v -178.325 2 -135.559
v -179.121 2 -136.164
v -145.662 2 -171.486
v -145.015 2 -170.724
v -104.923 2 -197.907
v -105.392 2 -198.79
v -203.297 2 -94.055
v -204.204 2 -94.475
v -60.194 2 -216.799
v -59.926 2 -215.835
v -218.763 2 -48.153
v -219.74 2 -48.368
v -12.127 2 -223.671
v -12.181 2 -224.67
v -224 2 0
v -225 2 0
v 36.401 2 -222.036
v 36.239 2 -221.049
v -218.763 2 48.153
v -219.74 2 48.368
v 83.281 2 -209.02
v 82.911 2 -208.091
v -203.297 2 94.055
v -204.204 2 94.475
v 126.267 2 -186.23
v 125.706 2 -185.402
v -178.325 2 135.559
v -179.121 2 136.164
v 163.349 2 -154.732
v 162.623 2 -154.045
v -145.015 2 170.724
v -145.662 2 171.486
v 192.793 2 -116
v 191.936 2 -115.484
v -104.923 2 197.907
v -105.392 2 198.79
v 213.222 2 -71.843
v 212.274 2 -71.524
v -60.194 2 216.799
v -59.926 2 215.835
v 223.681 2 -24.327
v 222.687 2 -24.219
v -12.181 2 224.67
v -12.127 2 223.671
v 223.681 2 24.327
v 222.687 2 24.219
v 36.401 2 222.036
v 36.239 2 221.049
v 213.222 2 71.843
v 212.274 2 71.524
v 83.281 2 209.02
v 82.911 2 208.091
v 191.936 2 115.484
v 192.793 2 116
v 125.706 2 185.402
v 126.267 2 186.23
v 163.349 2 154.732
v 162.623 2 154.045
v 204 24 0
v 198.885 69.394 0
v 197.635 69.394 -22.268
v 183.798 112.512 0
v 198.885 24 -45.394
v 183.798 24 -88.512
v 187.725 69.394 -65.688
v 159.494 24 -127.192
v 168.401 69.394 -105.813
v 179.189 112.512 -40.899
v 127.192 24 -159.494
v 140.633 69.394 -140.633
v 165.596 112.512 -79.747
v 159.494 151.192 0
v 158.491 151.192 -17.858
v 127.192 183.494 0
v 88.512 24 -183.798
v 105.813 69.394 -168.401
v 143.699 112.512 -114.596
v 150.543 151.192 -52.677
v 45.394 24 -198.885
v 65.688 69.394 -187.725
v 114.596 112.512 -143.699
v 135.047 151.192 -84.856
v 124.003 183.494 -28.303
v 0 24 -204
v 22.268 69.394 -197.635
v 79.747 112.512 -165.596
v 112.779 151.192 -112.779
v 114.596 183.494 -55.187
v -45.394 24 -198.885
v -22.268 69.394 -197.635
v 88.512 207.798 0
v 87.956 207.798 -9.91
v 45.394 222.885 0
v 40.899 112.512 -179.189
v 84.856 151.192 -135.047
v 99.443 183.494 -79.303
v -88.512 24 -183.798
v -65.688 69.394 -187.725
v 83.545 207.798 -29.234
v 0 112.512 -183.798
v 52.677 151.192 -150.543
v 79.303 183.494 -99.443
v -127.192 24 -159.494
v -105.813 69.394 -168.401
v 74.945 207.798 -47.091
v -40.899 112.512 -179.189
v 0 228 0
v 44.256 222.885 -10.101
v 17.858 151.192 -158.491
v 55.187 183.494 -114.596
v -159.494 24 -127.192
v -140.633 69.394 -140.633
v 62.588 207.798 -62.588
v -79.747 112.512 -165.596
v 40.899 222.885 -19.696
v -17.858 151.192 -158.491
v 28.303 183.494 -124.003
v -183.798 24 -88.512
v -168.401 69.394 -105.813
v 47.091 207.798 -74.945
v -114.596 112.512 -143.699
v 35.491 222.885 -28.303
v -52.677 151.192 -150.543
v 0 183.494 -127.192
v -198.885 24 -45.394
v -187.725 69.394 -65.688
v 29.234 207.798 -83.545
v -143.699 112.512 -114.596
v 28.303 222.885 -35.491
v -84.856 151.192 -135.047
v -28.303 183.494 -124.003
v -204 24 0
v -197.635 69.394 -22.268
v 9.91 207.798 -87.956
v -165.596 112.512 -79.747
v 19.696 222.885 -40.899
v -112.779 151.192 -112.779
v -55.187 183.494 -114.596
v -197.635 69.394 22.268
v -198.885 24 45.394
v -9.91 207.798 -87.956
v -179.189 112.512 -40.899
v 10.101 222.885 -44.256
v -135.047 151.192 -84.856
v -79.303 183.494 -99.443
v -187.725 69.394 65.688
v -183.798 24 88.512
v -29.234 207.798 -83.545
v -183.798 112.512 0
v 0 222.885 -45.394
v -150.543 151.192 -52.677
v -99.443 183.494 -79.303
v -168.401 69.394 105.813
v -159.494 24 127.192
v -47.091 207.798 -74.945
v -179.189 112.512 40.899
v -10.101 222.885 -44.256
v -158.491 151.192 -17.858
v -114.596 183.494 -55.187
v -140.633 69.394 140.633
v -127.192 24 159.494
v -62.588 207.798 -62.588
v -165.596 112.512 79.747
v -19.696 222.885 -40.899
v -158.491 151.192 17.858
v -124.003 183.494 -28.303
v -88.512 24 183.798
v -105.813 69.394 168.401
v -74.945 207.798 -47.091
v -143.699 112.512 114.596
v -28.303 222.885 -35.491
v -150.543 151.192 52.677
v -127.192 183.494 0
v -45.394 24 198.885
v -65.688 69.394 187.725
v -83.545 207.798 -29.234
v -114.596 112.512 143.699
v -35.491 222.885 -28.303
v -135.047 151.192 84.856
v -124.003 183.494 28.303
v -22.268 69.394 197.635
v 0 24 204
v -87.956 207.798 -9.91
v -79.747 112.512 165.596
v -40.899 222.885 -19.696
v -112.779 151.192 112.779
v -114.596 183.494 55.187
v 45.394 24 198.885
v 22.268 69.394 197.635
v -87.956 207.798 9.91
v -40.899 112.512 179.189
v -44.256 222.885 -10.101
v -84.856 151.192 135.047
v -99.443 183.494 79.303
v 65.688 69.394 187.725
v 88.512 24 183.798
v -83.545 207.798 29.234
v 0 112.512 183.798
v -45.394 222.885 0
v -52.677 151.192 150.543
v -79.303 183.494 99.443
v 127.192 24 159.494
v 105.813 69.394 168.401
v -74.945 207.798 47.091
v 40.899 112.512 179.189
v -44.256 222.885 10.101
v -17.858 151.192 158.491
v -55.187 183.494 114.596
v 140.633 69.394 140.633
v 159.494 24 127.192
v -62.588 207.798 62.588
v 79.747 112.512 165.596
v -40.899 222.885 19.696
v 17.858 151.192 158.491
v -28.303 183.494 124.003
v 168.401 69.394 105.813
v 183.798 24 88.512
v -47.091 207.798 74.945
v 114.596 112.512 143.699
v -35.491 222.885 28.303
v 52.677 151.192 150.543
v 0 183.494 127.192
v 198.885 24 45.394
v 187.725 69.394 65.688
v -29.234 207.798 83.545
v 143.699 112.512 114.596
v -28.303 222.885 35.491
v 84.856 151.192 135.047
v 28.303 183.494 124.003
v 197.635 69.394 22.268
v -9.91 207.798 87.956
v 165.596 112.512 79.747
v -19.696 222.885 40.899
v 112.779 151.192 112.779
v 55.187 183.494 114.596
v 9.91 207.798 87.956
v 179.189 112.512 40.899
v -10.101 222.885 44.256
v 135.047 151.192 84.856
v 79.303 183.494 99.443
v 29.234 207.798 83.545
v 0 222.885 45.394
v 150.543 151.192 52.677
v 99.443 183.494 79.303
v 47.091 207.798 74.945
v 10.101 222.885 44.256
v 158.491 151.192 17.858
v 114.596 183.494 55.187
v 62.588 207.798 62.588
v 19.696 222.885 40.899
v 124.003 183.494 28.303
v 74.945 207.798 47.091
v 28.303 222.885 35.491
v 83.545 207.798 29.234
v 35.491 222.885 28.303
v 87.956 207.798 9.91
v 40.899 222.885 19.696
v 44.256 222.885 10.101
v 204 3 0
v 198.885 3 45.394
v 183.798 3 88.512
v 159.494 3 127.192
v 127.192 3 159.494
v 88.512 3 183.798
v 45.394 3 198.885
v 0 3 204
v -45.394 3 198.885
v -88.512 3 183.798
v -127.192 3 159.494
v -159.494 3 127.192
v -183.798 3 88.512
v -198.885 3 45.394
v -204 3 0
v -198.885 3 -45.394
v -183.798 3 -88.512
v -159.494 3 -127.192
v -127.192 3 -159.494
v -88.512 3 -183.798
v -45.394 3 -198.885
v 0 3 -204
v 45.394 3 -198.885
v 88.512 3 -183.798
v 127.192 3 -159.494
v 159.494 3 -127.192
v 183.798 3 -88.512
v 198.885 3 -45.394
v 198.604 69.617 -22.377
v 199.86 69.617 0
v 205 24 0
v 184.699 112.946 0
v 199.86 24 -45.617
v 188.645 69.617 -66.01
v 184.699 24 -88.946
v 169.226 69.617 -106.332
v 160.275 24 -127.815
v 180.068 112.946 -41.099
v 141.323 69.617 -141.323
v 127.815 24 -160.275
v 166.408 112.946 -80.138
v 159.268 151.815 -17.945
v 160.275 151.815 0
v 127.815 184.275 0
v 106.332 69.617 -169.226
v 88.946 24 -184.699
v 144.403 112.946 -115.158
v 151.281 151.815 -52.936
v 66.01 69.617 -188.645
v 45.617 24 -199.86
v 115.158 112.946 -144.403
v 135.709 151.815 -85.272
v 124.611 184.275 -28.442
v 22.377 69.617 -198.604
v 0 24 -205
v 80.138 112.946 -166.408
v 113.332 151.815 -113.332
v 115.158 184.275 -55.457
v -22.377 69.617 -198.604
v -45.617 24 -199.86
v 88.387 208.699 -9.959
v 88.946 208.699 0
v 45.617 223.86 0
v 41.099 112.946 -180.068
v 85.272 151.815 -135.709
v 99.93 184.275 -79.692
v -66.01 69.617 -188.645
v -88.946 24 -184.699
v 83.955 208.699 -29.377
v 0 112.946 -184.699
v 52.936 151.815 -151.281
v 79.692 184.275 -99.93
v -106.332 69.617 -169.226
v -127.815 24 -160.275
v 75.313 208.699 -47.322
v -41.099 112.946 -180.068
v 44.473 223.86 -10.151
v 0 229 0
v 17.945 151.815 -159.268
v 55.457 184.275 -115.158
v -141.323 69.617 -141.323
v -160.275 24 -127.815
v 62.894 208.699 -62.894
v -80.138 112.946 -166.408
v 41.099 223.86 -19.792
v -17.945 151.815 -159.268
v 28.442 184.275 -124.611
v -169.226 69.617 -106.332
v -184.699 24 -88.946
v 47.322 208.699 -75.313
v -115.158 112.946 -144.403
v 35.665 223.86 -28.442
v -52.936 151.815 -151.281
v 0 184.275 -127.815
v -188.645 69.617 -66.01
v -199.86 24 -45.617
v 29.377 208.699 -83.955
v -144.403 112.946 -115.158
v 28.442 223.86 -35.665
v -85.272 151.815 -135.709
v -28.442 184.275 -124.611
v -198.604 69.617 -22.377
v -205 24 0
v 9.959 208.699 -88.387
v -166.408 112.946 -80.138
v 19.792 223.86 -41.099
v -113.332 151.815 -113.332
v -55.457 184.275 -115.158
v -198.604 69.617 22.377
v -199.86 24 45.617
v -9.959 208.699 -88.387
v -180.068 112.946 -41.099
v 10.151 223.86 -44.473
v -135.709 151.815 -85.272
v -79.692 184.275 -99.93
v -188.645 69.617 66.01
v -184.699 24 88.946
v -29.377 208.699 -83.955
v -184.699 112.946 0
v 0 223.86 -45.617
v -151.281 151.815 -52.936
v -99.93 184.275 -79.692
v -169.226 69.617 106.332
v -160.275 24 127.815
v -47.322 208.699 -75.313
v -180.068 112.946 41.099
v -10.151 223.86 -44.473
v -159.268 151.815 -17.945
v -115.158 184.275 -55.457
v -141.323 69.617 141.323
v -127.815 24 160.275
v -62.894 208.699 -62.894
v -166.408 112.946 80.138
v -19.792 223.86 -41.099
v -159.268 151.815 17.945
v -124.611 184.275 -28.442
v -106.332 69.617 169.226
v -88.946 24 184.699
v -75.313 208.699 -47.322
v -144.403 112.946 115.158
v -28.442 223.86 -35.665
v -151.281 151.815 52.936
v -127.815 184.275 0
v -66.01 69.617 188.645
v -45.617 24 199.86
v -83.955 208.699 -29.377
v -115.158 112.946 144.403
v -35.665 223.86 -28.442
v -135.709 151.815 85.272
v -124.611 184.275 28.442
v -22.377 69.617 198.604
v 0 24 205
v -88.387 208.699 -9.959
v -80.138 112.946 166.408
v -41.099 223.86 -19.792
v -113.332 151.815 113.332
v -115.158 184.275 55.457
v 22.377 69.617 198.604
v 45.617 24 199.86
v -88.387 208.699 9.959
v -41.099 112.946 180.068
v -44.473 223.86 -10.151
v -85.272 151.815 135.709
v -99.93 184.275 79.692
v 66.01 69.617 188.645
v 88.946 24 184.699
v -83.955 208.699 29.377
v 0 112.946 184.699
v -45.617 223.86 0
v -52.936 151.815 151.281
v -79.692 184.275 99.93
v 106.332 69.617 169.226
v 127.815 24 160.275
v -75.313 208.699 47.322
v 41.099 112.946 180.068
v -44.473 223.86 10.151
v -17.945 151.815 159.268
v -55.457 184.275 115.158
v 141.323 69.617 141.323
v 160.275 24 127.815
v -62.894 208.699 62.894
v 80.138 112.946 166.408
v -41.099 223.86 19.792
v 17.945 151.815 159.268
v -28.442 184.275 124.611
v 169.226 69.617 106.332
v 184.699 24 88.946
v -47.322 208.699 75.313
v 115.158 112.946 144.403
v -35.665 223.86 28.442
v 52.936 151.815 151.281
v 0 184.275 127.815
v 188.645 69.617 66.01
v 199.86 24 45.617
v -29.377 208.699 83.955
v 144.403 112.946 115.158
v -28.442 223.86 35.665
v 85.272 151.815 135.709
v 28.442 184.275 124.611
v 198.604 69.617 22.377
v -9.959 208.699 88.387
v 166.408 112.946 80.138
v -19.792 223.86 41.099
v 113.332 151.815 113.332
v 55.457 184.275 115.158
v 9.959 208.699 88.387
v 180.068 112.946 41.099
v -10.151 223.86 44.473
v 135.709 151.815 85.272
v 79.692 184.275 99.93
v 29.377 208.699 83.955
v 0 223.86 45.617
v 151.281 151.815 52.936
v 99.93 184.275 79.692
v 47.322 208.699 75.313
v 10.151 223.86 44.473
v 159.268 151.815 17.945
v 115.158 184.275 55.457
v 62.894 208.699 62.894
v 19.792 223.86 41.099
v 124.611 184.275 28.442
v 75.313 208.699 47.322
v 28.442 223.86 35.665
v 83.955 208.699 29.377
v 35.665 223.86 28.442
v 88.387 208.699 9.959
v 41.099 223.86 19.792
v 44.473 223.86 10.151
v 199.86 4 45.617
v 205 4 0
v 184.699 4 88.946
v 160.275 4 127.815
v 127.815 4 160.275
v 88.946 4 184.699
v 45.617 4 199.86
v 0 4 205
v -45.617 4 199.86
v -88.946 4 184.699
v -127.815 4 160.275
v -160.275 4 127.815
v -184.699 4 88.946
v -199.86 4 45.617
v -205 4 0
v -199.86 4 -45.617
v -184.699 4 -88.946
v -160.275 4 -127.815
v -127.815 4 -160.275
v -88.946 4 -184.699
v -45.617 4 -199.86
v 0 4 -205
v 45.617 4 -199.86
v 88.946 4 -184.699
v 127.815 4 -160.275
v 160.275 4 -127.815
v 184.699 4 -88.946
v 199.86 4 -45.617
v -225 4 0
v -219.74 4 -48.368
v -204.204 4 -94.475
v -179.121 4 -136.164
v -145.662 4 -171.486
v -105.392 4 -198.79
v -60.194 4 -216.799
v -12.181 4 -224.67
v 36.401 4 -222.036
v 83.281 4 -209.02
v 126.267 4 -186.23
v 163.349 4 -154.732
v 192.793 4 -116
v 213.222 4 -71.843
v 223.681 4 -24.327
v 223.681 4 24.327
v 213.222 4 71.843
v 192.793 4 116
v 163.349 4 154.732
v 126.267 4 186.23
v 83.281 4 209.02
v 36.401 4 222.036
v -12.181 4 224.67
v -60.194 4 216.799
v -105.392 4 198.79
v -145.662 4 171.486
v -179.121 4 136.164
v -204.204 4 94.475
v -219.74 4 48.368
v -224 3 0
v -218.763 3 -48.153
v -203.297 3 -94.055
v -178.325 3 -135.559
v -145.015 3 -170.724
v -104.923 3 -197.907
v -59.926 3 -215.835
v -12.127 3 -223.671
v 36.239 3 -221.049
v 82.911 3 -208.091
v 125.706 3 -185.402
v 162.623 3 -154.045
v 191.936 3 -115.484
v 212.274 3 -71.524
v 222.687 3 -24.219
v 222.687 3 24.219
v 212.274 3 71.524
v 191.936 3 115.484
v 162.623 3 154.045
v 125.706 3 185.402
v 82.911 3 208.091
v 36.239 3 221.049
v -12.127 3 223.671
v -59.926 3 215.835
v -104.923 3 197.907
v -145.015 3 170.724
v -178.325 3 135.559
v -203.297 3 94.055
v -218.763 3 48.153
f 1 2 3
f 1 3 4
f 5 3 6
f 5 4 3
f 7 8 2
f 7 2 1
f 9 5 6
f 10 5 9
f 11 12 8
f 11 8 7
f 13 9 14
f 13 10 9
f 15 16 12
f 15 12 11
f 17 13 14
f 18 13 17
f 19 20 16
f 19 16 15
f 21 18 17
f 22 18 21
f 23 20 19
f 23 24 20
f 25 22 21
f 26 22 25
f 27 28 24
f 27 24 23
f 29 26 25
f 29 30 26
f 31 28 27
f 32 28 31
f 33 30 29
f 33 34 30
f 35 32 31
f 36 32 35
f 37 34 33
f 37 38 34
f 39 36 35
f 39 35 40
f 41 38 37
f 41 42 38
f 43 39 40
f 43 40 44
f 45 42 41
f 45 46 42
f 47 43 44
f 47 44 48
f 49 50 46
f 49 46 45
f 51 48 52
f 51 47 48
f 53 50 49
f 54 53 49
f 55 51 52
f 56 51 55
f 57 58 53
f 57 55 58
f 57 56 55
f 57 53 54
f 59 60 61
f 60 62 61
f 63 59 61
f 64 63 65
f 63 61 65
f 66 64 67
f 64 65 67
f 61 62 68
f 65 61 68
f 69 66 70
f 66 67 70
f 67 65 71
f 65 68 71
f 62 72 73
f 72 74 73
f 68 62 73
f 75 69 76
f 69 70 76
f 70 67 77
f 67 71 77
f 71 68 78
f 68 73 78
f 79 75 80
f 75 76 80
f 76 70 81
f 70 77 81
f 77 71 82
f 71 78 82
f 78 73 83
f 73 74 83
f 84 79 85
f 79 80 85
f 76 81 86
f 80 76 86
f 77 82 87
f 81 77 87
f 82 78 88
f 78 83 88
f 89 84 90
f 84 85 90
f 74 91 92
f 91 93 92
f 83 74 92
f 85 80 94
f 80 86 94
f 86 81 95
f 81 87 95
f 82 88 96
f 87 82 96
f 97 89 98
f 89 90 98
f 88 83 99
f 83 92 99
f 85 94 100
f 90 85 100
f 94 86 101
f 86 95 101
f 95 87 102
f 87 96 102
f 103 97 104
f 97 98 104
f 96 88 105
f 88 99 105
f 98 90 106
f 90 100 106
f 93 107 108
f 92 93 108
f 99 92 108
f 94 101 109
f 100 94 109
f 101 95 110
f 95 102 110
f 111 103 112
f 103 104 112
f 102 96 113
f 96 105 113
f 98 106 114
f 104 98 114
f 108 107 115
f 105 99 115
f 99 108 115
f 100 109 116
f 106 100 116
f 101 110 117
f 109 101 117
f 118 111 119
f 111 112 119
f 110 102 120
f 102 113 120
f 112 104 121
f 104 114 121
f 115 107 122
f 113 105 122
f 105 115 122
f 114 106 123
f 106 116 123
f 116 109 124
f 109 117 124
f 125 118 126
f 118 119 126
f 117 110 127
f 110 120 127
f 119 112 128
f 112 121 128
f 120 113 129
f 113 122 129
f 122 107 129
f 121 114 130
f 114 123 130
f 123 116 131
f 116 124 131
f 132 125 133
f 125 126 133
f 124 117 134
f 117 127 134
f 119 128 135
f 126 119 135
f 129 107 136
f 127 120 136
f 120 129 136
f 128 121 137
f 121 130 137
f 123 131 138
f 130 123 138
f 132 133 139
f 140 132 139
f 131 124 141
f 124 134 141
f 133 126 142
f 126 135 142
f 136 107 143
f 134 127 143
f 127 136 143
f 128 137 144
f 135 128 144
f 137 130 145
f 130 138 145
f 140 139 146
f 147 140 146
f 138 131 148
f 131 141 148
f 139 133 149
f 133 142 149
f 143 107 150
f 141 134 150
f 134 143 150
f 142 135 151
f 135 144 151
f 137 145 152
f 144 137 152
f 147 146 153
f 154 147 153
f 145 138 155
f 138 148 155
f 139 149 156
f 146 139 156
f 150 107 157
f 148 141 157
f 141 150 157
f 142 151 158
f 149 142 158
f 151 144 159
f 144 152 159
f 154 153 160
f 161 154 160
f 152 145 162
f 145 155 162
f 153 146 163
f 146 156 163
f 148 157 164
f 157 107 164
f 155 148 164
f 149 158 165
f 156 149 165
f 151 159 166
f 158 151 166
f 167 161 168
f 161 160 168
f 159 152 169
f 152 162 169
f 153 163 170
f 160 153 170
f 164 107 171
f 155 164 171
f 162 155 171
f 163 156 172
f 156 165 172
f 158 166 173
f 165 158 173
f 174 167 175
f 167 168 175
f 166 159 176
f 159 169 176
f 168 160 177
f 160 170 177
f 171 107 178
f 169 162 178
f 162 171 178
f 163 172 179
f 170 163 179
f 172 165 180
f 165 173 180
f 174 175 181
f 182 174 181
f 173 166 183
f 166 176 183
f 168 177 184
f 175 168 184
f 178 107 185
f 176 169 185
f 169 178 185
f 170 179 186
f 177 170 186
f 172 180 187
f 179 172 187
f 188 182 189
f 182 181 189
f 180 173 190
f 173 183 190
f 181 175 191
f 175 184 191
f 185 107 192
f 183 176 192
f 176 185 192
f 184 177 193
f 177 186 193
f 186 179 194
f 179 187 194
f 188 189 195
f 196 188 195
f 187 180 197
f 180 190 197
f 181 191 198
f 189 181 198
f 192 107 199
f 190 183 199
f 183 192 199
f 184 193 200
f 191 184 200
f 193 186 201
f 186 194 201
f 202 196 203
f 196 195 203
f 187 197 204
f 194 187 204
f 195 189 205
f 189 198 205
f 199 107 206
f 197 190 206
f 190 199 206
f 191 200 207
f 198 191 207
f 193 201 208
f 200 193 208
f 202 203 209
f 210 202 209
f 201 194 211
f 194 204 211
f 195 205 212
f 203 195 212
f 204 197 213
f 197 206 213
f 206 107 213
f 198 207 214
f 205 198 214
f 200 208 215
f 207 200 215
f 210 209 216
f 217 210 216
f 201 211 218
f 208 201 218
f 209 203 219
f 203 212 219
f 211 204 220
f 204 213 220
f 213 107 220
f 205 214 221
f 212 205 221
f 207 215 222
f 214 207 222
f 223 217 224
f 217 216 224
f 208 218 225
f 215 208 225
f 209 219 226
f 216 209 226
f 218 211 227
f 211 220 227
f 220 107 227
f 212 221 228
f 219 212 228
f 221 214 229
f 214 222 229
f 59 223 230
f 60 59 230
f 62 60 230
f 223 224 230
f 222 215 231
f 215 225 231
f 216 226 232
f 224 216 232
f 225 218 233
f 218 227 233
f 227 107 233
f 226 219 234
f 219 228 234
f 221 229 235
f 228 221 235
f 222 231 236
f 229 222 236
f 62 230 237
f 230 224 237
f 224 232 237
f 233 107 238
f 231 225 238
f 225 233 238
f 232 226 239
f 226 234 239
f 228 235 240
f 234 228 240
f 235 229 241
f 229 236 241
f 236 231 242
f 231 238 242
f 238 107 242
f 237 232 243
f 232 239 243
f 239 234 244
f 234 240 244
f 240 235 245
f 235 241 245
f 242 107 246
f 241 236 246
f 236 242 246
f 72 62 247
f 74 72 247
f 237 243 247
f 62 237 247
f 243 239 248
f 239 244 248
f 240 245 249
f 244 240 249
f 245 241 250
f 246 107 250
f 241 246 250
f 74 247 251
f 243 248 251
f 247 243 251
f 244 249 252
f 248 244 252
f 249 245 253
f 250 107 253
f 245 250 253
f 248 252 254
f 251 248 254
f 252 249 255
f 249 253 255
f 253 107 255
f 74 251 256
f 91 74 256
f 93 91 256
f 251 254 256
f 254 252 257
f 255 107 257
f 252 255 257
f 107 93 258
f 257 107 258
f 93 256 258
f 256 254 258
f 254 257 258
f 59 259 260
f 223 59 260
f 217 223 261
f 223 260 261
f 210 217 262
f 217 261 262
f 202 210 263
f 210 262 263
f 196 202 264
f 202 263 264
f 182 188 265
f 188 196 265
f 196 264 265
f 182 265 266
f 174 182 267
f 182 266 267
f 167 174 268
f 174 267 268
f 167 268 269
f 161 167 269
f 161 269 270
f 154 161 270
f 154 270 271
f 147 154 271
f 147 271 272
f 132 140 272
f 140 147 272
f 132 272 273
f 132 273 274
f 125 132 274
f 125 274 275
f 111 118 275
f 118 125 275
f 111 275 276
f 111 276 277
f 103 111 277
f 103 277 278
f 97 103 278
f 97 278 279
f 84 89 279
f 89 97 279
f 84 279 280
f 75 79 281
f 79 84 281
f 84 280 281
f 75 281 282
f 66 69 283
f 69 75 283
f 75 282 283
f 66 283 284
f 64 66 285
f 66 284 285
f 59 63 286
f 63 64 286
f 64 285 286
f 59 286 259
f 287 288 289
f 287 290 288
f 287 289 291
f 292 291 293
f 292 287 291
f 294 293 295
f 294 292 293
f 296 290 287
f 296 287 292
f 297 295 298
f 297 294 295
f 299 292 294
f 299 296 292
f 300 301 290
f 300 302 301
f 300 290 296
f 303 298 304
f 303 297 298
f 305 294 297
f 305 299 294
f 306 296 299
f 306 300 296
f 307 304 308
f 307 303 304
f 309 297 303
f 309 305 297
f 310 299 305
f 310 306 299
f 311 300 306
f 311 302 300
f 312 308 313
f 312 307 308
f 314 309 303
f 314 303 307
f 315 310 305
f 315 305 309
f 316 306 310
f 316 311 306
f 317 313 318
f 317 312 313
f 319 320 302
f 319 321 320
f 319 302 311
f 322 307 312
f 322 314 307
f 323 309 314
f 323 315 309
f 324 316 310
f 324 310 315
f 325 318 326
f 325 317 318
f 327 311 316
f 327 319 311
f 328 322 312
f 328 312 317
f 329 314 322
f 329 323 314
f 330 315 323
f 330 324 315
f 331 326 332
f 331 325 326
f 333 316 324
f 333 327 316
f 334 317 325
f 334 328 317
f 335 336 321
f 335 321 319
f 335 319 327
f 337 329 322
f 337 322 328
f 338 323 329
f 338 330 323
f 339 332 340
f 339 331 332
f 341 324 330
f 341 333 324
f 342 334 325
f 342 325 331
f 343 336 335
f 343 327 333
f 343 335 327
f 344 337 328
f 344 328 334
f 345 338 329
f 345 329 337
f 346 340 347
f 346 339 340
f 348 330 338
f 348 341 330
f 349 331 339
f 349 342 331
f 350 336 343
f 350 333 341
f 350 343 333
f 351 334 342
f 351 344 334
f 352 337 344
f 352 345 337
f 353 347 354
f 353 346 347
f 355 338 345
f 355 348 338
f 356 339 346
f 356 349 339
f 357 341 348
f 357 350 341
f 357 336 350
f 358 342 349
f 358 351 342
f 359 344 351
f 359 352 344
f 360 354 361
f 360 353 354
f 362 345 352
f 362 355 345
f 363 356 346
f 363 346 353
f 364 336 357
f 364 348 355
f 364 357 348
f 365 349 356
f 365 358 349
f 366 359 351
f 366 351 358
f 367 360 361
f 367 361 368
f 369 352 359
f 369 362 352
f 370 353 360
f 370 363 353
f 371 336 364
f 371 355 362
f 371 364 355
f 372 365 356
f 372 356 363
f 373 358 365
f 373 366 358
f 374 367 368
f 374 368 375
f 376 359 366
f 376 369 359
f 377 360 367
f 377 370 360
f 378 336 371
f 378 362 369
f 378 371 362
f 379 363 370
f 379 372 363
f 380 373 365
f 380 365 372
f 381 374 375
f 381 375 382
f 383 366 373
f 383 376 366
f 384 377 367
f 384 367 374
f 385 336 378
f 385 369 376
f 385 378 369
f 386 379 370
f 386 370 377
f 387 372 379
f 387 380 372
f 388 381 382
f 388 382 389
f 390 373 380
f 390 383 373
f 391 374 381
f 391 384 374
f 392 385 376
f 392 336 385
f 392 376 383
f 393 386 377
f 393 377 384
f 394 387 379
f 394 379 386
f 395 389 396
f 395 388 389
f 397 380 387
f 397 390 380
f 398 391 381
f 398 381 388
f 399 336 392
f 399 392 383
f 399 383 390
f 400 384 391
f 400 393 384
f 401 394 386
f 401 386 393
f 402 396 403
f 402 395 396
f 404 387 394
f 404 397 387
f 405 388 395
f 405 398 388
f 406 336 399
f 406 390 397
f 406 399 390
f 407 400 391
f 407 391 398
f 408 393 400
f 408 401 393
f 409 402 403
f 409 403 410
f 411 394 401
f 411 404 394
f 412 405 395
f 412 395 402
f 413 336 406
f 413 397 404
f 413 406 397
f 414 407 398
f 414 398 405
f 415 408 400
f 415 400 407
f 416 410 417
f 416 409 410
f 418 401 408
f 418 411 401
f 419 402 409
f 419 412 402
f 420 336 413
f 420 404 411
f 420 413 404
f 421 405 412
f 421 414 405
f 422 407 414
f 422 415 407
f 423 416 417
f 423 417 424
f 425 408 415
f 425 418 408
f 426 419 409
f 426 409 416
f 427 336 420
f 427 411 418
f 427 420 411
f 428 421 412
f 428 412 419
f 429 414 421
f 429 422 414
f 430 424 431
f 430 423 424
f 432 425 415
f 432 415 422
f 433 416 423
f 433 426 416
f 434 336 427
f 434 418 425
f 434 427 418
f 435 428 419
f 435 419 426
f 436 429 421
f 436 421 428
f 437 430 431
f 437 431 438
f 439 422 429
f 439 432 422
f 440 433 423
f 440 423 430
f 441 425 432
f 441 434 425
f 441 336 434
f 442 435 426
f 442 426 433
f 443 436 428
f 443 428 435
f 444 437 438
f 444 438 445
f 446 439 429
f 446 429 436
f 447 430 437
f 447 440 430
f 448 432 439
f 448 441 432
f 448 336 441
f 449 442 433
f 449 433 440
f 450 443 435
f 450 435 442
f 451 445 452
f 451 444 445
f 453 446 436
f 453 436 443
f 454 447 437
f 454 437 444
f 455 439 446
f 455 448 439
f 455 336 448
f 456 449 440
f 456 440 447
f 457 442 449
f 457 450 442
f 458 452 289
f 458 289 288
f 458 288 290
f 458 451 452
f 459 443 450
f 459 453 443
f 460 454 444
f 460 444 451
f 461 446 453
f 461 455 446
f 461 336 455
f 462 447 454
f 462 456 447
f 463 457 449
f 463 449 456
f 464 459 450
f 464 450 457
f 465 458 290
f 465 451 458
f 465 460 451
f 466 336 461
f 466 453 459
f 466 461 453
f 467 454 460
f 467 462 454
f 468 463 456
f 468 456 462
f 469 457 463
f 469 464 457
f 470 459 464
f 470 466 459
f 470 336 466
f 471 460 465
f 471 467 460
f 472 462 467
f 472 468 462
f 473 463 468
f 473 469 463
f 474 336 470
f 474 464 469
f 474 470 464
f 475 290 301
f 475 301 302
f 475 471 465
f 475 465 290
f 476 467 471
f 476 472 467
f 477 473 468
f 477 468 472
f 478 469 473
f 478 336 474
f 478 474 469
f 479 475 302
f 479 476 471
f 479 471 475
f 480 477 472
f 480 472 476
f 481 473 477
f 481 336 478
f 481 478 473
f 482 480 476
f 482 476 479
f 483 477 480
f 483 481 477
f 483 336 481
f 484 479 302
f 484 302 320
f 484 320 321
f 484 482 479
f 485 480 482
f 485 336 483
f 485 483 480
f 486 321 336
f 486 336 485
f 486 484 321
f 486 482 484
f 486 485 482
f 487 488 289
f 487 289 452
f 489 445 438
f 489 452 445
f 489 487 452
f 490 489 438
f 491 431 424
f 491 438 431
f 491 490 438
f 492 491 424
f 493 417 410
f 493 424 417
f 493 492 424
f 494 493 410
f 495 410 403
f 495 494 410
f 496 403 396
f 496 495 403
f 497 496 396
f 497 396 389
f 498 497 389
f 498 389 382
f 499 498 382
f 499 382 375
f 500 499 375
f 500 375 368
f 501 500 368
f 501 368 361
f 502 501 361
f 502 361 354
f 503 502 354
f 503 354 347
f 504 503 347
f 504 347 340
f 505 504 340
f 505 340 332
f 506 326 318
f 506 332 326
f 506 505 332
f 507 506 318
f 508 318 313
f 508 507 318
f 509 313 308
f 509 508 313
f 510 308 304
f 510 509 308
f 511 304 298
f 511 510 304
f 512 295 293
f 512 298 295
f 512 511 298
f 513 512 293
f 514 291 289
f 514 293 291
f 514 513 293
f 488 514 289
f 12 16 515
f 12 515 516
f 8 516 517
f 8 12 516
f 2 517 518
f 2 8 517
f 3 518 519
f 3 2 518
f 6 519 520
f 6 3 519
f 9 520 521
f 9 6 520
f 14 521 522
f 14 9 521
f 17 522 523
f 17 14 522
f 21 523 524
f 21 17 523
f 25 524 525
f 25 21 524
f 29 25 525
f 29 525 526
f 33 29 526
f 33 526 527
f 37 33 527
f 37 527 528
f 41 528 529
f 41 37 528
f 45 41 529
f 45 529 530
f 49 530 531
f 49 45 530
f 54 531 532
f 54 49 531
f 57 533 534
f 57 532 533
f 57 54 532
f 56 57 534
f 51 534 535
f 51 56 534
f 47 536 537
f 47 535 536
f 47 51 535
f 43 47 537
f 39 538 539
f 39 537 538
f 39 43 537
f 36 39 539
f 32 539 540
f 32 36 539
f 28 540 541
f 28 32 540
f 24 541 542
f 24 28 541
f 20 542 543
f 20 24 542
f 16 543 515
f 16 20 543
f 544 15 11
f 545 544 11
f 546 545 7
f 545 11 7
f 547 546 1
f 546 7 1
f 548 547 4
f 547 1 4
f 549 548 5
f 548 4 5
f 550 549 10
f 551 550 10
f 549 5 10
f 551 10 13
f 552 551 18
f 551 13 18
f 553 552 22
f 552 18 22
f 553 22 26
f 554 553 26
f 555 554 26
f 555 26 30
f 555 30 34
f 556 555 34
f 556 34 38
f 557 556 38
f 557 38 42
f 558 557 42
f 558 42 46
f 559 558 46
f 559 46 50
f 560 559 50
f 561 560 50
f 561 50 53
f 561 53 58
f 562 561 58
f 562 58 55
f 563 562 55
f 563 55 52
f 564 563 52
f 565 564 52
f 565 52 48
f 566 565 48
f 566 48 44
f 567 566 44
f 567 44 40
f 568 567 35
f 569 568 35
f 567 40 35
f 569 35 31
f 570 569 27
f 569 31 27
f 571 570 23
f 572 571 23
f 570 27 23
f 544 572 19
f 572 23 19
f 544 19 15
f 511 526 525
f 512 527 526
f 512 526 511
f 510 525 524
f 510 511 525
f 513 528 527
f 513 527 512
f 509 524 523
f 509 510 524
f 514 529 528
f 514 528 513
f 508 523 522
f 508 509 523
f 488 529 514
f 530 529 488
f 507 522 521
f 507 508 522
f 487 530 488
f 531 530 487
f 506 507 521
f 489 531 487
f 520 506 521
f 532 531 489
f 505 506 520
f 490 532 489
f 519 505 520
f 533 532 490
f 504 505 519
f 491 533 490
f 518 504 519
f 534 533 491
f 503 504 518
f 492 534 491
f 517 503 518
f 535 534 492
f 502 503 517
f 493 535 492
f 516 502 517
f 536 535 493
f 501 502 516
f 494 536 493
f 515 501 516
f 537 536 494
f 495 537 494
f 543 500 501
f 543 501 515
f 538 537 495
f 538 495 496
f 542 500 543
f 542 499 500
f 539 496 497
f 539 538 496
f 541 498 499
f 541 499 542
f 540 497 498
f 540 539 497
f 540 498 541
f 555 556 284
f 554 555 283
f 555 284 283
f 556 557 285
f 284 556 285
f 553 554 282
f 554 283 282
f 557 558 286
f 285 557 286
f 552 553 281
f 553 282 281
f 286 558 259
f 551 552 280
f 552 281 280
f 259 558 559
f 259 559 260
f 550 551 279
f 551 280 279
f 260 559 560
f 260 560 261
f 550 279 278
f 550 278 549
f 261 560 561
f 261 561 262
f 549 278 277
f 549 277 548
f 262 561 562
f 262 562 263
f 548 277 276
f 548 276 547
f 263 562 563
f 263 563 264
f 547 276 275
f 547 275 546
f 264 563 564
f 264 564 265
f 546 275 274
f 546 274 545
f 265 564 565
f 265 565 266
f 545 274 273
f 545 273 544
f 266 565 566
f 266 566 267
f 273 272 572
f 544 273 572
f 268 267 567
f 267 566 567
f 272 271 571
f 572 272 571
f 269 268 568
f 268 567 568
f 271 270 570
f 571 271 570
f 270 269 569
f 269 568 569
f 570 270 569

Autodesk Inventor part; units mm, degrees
ref_plane "YZ Plane" through (0, 0, 0) normal (1, 0, 0) x (0, 1, 0)
ref_plane "XZ Plane" through (0, 0, 0) normal (0, 1, 0) x (-1, 0, 0)
ref_plane "XY Plane" through (0, 0, 0) normal (0, 0, 1) x (1, 0, 0)
sketch "Sketch1" plane through (0, 0, 0) normal (0, 1, 0) x (-1, 0, 0)
  circle A0 centre (0, 0) radius 225
  dimension "d0" = 450
extrude "Extrusion1" add sketch "Sketch1" along normal blind 4
sketch "Sketch2" plane through (0, 4, 0) normal (0, 1, 0) x (1, 0, 0)
  circle A0 centre (0, 0) radius 205
  dimension "d3" = 410
extrude "Extrusion2" add sketch "Sketch2" along normal blind 225
sketch "Sketch3" plane through (0, 0, 0) normal (0, -1, 0) x (1, 0, 0)
  circle A0 centre (0, 0) radius 225
  dimension "d7" = 450
extrude "Extrusion3" cut sketch "Sketch3" against normal blind 2
fillet "Fillet2" radius 205 1 edges at (-205, 229, 0)
shell "Shell3" thickness 1 removed faces 1 at (5.0301, 2, -73.6911)
properties part number "450mmdome" material "Polycarbonate, Clear"
